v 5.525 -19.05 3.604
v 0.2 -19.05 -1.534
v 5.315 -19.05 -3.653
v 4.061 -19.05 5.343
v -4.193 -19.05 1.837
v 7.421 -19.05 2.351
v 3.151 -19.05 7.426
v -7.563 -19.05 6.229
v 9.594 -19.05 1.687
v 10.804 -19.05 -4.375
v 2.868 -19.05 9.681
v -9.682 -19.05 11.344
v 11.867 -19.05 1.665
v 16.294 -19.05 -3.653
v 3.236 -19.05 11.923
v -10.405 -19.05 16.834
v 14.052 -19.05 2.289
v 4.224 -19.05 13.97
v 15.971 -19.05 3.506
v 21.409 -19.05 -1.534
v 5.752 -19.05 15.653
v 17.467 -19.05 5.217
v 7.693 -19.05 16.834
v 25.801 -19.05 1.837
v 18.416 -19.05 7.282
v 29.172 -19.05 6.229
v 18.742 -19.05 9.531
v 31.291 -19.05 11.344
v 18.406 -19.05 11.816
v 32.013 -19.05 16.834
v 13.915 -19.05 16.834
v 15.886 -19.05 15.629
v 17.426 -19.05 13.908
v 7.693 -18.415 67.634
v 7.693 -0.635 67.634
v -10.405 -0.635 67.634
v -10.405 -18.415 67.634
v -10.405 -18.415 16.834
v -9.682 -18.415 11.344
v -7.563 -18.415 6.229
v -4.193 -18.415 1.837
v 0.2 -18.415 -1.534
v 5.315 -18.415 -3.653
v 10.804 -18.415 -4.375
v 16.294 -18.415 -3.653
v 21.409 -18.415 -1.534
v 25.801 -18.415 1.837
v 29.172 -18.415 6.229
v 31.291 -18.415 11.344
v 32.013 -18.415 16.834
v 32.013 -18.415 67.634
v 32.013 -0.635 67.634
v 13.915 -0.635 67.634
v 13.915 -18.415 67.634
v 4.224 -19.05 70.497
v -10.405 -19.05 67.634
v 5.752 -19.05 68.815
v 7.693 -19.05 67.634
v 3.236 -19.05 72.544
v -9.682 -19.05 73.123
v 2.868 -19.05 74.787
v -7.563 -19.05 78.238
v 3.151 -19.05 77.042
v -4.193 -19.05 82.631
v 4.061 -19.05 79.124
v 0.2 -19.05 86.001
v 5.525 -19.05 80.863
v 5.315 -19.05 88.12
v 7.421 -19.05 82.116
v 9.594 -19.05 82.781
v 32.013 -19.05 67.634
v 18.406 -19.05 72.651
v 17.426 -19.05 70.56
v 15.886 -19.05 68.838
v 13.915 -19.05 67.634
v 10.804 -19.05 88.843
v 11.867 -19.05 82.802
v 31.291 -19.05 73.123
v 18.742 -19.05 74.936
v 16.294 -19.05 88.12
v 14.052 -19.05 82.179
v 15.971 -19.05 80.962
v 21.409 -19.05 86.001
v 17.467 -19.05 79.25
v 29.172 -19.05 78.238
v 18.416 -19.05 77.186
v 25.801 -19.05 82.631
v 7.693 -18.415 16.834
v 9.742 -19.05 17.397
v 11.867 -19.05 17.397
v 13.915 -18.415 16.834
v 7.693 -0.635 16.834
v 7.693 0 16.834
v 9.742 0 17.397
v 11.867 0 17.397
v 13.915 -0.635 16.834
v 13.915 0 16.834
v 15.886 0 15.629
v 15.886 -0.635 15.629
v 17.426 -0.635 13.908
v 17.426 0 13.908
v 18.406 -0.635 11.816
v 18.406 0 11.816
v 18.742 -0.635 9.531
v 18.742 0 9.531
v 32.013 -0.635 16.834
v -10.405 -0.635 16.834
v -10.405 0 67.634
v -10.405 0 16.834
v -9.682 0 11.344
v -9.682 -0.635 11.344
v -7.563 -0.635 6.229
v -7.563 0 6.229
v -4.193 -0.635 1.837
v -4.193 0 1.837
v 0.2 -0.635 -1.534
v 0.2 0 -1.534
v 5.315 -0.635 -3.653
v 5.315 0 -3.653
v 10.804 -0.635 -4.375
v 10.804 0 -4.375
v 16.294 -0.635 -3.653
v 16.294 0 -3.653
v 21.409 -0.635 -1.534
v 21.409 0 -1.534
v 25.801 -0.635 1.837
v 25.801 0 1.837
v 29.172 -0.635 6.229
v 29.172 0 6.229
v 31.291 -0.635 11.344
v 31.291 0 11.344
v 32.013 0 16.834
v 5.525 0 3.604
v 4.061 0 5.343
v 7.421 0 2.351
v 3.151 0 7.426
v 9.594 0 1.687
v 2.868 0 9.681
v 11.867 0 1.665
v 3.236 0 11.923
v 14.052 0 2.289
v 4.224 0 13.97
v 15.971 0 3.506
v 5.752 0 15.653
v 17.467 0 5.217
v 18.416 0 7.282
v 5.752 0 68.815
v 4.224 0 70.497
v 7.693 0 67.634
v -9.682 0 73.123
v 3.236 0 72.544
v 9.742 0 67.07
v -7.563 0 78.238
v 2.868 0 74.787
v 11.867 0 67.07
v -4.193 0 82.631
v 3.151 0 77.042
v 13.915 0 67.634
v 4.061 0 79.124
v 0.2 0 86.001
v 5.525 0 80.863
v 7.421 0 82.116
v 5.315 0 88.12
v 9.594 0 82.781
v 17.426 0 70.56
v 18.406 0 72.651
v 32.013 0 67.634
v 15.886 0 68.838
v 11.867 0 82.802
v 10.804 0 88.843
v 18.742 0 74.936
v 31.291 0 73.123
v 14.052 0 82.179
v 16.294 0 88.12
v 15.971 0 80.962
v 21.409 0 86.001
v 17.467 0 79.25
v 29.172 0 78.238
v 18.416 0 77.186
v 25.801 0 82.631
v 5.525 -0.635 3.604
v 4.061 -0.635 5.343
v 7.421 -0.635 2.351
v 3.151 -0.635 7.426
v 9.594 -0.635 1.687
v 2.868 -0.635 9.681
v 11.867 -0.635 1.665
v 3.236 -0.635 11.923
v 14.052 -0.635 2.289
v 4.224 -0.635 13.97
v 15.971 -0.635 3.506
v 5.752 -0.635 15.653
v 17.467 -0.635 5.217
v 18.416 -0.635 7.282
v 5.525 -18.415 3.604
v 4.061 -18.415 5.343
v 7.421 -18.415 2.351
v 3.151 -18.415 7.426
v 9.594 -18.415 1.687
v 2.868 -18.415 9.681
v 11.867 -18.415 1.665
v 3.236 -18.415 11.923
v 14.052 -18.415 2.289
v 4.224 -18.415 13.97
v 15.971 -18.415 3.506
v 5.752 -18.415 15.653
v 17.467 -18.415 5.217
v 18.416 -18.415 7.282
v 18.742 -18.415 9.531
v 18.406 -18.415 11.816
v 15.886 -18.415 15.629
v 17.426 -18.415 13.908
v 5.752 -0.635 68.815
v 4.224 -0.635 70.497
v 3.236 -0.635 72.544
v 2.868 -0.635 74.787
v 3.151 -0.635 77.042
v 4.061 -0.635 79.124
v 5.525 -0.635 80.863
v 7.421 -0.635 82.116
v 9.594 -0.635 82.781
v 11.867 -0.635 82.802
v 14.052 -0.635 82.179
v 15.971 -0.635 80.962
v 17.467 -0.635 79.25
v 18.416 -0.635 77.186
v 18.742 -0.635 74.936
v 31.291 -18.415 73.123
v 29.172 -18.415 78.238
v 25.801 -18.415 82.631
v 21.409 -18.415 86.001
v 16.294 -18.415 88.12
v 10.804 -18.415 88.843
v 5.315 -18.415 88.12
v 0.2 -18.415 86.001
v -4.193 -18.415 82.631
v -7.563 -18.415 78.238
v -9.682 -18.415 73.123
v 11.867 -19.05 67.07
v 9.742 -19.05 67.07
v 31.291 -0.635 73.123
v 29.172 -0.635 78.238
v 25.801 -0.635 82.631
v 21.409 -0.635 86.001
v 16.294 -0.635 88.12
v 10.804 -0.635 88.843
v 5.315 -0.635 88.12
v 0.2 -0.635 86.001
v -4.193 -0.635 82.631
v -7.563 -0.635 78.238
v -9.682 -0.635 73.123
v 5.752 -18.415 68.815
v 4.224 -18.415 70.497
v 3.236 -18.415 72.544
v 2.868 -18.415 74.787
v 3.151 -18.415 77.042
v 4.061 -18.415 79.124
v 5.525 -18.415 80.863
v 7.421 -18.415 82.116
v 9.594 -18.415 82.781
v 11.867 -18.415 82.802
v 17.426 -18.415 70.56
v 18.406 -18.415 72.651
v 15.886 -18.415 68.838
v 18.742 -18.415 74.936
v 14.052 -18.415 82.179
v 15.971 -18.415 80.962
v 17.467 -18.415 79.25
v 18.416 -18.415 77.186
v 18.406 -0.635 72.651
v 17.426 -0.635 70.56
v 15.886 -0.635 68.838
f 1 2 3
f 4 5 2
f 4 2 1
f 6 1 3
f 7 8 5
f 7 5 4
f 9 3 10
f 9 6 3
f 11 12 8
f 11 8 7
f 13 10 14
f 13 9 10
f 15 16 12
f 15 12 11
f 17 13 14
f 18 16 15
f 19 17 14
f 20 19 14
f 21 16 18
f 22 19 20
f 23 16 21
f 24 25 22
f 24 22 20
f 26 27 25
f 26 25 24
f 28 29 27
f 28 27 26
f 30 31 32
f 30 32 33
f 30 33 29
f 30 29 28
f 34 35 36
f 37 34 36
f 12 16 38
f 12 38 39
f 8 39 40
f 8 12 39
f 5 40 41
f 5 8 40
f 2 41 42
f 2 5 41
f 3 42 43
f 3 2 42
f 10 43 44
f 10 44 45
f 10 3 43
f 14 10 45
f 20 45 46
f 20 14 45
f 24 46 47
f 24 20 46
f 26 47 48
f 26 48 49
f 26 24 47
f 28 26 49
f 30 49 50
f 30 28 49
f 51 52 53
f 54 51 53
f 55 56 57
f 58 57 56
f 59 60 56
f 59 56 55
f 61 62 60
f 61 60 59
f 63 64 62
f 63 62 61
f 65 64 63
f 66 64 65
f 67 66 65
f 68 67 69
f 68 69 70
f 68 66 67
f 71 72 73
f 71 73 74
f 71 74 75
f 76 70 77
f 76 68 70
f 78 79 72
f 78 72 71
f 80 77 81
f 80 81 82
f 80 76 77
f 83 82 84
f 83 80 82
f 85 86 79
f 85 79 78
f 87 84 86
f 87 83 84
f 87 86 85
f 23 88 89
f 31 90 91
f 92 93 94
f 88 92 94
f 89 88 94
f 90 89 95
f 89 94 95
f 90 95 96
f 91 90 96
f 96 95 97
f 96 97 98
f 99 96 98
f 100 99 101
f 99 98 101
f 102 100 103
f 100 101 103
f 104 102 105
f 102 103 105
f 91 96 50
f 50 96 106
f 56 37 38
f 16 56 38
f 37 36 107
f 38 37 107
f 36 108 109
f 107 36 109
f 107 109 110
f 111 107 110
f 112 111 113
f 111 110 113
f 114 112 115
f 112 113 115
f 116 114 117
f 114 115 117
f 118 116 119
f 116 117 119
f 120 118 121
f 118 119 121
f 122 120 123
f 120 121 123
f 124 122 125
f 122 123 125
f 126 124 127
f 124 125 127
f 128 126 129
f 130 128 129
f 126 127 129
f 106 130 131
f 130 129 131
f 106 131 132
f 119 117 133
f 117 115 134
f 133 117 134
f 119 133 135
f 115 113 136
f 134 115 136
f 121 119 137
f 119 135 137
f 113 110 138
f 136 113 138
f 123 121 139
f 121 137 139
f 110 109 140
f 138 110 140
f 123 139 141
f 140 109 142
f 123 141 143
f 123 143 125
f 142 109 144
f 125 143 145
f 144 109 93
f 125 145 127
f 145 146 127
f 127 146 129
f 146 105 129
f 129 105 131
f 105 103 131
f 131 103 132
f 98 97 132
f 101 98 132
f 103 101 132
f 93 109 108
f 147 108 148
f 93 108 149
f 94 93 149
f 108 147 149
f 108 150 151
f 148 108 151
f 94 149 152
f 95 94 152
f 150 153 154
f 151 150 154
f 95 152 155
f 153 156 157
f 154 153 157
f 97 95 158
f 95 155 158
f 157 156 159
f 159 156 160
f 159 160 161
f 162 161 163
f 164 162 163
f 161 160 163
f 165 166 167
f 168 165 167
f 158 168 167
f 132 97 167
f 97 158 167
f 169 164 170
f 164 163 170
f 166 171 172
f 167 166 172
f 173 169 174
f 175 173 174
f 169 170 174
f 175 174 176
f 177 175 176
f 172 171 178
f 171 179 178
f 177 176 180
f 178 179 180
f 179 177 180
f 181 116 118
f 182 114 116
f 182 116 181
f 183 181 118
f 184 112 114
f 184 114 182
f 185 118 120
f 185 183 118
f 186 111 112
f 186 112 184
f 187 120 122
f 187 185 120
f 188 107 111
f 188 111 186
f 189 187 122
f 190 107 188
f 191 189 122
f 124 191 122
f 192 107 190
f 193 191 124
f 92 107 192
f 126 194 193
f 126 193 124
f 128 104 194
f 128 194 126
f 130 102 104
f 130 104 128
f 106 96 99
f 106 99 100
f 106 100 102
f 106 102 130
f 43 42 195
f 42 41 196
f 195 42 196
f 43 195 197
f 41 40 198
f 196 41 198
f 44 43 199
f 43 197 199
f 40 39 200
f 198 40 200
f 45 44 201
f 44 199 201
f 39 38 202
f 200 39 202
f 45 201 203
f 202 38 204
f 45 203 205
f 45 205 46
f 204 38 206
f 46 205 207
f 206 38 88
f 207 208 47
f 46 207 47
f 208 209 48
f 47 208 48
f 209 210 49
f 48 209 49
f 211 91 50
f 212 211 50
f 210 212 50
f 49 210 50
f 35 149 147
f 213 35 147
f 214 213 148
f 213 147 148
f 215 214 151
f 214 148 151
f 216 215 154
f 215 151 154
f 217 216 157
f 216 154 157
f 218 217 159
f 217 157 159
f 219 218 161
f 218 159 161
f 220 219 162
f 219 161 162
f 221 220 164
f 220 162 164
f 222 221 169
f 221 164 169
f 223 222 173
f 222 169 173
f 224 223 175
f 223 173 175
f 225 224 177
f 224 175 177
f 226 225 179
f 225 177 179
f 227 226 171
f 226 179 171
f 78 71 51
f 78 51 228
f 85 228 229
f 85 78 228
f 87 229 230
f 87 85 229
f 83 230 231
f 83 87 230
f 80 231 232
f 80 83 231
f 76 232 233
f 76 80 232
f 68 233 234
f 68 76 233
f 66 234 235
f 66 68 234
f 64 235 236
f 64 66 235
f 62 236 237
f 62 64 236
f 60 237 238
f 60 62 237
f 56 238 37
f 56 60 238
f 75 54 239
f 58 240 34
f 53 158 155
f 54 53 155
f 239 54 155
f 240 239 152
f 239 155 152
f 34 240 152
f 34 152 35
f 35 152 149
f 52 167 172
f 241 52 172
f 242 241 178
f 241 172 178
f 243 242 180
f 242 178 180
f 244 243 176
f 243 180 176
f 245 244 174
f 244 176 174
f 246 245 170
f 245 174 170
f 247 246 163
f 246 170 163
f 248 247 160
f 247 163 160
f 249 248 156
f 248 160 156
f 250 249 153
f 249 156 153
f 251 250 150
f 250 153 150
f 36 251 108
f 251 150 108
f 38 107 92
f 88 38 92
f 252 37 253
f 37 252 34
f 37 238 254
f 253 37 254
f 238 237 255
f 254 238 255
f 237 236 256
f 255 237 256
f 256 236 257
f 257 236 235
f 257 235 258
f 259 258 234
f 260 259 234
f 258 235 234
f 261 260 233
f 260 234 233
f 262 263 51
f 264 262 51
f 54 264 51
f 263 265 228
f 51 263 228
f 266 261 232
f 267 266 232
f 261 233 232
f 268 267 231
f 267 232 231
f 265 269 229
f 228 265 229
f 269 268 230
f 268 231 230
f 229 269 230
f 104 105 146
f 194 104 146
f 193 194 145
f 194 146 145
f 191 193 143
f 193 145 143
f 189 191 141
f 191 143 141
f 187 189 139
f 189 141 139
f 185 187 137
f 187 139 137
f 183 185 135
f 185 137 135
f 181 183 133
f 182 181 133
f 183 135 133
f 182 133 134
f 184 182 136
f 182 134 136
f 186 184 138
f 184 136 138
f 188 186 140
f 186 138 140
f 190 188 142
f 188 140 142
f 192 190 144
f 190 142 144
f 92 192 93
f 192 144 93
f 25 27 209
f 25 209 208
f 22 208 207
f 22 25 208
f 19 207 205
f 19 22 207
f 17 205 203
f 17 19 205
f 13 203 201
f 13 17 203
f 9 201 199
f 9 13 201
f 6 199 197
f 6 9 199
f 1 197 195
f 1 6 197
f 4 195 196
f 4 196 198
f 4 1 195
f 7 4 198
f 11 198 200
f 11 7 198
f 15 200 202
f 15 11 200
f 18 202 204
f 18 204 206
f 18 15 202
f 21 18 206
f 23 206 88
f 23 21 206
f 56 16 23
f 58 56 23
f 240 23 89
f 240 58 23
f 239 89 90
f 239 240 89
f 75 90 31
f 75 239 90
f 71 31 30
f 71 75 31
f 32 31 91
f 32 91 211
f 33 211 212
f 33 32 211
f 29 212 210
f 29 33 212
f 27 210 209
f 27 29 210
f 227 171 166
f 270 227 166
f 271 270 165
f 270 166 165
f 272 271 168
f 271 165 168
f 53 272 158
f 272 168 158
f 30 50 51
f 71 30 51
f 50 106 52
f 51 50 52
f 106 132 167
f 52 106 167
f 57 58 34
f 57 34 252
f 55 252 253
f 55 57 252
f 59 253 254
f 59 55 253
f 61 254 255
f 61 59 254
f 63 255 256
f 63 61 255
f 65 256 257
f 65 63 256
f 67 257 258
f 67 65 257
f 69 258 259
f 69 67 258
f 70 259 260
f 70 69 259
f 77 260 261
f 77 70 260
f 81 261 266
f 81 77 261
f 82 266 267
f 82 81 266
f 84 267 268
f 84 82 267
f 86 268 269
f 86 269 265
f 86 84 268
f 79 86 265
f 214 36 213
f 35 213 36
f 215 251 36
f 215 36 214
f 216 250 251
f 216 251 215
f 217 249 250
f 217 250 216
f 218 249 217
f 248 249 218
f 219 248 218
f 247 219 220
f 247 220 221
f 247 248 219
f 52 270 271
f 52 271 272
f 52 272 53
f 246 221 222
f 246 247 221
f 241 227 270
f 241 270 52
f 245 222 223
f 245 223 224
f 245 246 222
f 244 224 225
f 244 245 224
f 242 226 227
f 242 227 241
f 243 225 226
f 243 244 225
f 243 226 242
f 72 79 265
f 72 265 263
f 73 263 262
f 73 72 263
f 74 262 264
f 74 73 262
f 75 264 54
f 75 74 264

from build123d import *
from build123d import SkipClean  # not in build123d's __all__

# Parameters (mm, degrees)
F1_DEPTH = 19.05
F2_DEPTH = 0.635
F4_DEPTH = 0.635


with BuildPart() as f1:
    # F0 (on Front) → F1 (new body)
    with BuildSketch(Plane.XZ):
        with BuildLine():
            Line((7.6934193521, 67.6337401125), (-10.4047286745, 67.6337401125))
            Line((-10.4047286745, 67.6337401125), (-10.4047286745, 16.8337401125))
            Line((-10.4047286745, 16.8337401125), (7.6934193521, 16.8337401125))
            ThreePointArc((7.6934193521, 16.8337401125), (10.8042713255, 17.4687401125), (13.9151232988, 16.8337401125))
            Line((13.9151232988, 16.8337401125), (32.0132713255, 16.8337401125))
            Line((32.0132713255, 16.8337401125), (32.0132713255, 67.6337401125))
            Line((32.0132713255, 67.6337401125), (13.9151232988, 67.6337401125))
            ThreePointArc((13.9151232988, 67.6337401125), (10.8042713255, 66.9987401125), (7.6934193521, 67.6337401125))
        make_face()
    extrude(amount=F1_DEPTH)

    # F0 (on Front) → F2 (join)
    with BuildSketch(Plane.XZ):
        with BuildLine():
            ThreePointArc((32.0132713255, 67.6337401125), (10.8042713255, 88.8427401125), (-10.4047286745, 67.6337401125))
            Line((-10.4047286745, 67.6337401125), (7.6934193521, 67.6337401125))
            ThreePointArc((7.6934193521, 67.6337401125), (6.4275420266, 81.5580334417), (18.7417713255, 74.9362401125))
            ThreePointArc((18.7417713255, 74.9362401125), (17.4260646546, 70.5595108136), (13.9151232988, 67.6337401125))
            Line((13.9151232988, 67.6337401125), (32.0132713255, 67.6337401125))
        make_face()
        with BuildLine():
            Line((7.6934193521, 67.6337401125), (-10.4047286745, 67.6337401125))
            Line((-10.4047286745, 67.6337401125), (-10.4047286745, 16.8337401125))
            Line((-10.4047286745, 16.8337401125), (7.6934193521, 16.8337401125))
            ThreePointArc((7.6934193521, 16.8337401125), (10.8042713255, 17.4687401125), (13.9151232988, 16.8337401125))
            Line((13.9151232988, 16.8337401125), (32.0132713255, 16.8337401125))
            Line((32.0132713255, 16.8337401125), (32.0132713255, 67.6337401125))
            Line((32.0132713255, 67.6337401125), (13.9151232988, 67.6337401125))
            ThreePointArc((13.9151232988, 67.6337401125), (10.8042713255, 66.9987401125), (7.6934193521, 67.6337401125))
        make_face()
        with BuildLine():
            Line((7.6934193521, 16.8337401125), (-10.4047286745, 16.8337401125))
            ThreePointArc((-10.4047286745, 16.8337401125), (10.8042713255, -4.3752598875), (32.0132713255, 16.8337401125))
            Line((32.0132713255, 16.8337401125), (13.9151232988, 16.8337401125))
            ThreePointArc((13.9151232988, 16.8337401125), (17.4260646546, 13.9079694114), (18.7417713255, 9.5312401125))
            ThreePointArc((18.7417713255, 9.5312401125), (6.4275420266, 2.9094467834), (7.6934193521, 16.8337401125))
        make_face()
    extrude(amount=F2_DEPTH)

    # F3 (on face) → F4 (join)
    with BuildSketch(Plane.XZ.offset(19.05)):
        with BuildLine():
            ThreePointArc((-10.4047286745, 16.8337401125), (10.8042713255, -4.3752598875), (32.0132713255, 16.8337401125))
            Line((32.0132713255, 16.8337401125), (13.9151232988, 16.8337401125))
            ThreePointArc((13.9151232988, 16.8337401125), (17.4260646546, 13.9079694114), (18.7417713255, 9.5312401125))
            ThreePointArc((18.7417713255, 9.5312401125), (6.4275420266, 2.9094467834), (7.6934193521, 16.8337401125))
            Line((7.6934193521, 16.8337401125), (-10.4047286745, 16.8337401125))
        make_face()
        with BuildLine():
            Line((13.9151232988, 67.6337401125), (32.0132713255, 67.6337401125))
            ThreePointArc((32.0132713255, 67.6337401125), (10.8042713255, 88.8427401125), (-10.4047286745, 67.6337401125))
            Line((-10.4047286745, 67.6337401125), (7.6934193521, 67.6337401125))
            ThreePointArc((7.6934193521, 67.6337401125), (6.4275420266, 81.5580334417), (18.7417713255, 74.9362401125))
            ThreePointArc((18.7417713255, 74.9362401125), (17.4260646546, 70.5595108136), (13.9151232988, 67.6337401125))
        make_face()
    with SkipClean():  # cleaning this boolean's faces spoils the solid; the shape is the same uncleaned
        extrude(amount=-F4_DEPTH)


solid = f1.part
